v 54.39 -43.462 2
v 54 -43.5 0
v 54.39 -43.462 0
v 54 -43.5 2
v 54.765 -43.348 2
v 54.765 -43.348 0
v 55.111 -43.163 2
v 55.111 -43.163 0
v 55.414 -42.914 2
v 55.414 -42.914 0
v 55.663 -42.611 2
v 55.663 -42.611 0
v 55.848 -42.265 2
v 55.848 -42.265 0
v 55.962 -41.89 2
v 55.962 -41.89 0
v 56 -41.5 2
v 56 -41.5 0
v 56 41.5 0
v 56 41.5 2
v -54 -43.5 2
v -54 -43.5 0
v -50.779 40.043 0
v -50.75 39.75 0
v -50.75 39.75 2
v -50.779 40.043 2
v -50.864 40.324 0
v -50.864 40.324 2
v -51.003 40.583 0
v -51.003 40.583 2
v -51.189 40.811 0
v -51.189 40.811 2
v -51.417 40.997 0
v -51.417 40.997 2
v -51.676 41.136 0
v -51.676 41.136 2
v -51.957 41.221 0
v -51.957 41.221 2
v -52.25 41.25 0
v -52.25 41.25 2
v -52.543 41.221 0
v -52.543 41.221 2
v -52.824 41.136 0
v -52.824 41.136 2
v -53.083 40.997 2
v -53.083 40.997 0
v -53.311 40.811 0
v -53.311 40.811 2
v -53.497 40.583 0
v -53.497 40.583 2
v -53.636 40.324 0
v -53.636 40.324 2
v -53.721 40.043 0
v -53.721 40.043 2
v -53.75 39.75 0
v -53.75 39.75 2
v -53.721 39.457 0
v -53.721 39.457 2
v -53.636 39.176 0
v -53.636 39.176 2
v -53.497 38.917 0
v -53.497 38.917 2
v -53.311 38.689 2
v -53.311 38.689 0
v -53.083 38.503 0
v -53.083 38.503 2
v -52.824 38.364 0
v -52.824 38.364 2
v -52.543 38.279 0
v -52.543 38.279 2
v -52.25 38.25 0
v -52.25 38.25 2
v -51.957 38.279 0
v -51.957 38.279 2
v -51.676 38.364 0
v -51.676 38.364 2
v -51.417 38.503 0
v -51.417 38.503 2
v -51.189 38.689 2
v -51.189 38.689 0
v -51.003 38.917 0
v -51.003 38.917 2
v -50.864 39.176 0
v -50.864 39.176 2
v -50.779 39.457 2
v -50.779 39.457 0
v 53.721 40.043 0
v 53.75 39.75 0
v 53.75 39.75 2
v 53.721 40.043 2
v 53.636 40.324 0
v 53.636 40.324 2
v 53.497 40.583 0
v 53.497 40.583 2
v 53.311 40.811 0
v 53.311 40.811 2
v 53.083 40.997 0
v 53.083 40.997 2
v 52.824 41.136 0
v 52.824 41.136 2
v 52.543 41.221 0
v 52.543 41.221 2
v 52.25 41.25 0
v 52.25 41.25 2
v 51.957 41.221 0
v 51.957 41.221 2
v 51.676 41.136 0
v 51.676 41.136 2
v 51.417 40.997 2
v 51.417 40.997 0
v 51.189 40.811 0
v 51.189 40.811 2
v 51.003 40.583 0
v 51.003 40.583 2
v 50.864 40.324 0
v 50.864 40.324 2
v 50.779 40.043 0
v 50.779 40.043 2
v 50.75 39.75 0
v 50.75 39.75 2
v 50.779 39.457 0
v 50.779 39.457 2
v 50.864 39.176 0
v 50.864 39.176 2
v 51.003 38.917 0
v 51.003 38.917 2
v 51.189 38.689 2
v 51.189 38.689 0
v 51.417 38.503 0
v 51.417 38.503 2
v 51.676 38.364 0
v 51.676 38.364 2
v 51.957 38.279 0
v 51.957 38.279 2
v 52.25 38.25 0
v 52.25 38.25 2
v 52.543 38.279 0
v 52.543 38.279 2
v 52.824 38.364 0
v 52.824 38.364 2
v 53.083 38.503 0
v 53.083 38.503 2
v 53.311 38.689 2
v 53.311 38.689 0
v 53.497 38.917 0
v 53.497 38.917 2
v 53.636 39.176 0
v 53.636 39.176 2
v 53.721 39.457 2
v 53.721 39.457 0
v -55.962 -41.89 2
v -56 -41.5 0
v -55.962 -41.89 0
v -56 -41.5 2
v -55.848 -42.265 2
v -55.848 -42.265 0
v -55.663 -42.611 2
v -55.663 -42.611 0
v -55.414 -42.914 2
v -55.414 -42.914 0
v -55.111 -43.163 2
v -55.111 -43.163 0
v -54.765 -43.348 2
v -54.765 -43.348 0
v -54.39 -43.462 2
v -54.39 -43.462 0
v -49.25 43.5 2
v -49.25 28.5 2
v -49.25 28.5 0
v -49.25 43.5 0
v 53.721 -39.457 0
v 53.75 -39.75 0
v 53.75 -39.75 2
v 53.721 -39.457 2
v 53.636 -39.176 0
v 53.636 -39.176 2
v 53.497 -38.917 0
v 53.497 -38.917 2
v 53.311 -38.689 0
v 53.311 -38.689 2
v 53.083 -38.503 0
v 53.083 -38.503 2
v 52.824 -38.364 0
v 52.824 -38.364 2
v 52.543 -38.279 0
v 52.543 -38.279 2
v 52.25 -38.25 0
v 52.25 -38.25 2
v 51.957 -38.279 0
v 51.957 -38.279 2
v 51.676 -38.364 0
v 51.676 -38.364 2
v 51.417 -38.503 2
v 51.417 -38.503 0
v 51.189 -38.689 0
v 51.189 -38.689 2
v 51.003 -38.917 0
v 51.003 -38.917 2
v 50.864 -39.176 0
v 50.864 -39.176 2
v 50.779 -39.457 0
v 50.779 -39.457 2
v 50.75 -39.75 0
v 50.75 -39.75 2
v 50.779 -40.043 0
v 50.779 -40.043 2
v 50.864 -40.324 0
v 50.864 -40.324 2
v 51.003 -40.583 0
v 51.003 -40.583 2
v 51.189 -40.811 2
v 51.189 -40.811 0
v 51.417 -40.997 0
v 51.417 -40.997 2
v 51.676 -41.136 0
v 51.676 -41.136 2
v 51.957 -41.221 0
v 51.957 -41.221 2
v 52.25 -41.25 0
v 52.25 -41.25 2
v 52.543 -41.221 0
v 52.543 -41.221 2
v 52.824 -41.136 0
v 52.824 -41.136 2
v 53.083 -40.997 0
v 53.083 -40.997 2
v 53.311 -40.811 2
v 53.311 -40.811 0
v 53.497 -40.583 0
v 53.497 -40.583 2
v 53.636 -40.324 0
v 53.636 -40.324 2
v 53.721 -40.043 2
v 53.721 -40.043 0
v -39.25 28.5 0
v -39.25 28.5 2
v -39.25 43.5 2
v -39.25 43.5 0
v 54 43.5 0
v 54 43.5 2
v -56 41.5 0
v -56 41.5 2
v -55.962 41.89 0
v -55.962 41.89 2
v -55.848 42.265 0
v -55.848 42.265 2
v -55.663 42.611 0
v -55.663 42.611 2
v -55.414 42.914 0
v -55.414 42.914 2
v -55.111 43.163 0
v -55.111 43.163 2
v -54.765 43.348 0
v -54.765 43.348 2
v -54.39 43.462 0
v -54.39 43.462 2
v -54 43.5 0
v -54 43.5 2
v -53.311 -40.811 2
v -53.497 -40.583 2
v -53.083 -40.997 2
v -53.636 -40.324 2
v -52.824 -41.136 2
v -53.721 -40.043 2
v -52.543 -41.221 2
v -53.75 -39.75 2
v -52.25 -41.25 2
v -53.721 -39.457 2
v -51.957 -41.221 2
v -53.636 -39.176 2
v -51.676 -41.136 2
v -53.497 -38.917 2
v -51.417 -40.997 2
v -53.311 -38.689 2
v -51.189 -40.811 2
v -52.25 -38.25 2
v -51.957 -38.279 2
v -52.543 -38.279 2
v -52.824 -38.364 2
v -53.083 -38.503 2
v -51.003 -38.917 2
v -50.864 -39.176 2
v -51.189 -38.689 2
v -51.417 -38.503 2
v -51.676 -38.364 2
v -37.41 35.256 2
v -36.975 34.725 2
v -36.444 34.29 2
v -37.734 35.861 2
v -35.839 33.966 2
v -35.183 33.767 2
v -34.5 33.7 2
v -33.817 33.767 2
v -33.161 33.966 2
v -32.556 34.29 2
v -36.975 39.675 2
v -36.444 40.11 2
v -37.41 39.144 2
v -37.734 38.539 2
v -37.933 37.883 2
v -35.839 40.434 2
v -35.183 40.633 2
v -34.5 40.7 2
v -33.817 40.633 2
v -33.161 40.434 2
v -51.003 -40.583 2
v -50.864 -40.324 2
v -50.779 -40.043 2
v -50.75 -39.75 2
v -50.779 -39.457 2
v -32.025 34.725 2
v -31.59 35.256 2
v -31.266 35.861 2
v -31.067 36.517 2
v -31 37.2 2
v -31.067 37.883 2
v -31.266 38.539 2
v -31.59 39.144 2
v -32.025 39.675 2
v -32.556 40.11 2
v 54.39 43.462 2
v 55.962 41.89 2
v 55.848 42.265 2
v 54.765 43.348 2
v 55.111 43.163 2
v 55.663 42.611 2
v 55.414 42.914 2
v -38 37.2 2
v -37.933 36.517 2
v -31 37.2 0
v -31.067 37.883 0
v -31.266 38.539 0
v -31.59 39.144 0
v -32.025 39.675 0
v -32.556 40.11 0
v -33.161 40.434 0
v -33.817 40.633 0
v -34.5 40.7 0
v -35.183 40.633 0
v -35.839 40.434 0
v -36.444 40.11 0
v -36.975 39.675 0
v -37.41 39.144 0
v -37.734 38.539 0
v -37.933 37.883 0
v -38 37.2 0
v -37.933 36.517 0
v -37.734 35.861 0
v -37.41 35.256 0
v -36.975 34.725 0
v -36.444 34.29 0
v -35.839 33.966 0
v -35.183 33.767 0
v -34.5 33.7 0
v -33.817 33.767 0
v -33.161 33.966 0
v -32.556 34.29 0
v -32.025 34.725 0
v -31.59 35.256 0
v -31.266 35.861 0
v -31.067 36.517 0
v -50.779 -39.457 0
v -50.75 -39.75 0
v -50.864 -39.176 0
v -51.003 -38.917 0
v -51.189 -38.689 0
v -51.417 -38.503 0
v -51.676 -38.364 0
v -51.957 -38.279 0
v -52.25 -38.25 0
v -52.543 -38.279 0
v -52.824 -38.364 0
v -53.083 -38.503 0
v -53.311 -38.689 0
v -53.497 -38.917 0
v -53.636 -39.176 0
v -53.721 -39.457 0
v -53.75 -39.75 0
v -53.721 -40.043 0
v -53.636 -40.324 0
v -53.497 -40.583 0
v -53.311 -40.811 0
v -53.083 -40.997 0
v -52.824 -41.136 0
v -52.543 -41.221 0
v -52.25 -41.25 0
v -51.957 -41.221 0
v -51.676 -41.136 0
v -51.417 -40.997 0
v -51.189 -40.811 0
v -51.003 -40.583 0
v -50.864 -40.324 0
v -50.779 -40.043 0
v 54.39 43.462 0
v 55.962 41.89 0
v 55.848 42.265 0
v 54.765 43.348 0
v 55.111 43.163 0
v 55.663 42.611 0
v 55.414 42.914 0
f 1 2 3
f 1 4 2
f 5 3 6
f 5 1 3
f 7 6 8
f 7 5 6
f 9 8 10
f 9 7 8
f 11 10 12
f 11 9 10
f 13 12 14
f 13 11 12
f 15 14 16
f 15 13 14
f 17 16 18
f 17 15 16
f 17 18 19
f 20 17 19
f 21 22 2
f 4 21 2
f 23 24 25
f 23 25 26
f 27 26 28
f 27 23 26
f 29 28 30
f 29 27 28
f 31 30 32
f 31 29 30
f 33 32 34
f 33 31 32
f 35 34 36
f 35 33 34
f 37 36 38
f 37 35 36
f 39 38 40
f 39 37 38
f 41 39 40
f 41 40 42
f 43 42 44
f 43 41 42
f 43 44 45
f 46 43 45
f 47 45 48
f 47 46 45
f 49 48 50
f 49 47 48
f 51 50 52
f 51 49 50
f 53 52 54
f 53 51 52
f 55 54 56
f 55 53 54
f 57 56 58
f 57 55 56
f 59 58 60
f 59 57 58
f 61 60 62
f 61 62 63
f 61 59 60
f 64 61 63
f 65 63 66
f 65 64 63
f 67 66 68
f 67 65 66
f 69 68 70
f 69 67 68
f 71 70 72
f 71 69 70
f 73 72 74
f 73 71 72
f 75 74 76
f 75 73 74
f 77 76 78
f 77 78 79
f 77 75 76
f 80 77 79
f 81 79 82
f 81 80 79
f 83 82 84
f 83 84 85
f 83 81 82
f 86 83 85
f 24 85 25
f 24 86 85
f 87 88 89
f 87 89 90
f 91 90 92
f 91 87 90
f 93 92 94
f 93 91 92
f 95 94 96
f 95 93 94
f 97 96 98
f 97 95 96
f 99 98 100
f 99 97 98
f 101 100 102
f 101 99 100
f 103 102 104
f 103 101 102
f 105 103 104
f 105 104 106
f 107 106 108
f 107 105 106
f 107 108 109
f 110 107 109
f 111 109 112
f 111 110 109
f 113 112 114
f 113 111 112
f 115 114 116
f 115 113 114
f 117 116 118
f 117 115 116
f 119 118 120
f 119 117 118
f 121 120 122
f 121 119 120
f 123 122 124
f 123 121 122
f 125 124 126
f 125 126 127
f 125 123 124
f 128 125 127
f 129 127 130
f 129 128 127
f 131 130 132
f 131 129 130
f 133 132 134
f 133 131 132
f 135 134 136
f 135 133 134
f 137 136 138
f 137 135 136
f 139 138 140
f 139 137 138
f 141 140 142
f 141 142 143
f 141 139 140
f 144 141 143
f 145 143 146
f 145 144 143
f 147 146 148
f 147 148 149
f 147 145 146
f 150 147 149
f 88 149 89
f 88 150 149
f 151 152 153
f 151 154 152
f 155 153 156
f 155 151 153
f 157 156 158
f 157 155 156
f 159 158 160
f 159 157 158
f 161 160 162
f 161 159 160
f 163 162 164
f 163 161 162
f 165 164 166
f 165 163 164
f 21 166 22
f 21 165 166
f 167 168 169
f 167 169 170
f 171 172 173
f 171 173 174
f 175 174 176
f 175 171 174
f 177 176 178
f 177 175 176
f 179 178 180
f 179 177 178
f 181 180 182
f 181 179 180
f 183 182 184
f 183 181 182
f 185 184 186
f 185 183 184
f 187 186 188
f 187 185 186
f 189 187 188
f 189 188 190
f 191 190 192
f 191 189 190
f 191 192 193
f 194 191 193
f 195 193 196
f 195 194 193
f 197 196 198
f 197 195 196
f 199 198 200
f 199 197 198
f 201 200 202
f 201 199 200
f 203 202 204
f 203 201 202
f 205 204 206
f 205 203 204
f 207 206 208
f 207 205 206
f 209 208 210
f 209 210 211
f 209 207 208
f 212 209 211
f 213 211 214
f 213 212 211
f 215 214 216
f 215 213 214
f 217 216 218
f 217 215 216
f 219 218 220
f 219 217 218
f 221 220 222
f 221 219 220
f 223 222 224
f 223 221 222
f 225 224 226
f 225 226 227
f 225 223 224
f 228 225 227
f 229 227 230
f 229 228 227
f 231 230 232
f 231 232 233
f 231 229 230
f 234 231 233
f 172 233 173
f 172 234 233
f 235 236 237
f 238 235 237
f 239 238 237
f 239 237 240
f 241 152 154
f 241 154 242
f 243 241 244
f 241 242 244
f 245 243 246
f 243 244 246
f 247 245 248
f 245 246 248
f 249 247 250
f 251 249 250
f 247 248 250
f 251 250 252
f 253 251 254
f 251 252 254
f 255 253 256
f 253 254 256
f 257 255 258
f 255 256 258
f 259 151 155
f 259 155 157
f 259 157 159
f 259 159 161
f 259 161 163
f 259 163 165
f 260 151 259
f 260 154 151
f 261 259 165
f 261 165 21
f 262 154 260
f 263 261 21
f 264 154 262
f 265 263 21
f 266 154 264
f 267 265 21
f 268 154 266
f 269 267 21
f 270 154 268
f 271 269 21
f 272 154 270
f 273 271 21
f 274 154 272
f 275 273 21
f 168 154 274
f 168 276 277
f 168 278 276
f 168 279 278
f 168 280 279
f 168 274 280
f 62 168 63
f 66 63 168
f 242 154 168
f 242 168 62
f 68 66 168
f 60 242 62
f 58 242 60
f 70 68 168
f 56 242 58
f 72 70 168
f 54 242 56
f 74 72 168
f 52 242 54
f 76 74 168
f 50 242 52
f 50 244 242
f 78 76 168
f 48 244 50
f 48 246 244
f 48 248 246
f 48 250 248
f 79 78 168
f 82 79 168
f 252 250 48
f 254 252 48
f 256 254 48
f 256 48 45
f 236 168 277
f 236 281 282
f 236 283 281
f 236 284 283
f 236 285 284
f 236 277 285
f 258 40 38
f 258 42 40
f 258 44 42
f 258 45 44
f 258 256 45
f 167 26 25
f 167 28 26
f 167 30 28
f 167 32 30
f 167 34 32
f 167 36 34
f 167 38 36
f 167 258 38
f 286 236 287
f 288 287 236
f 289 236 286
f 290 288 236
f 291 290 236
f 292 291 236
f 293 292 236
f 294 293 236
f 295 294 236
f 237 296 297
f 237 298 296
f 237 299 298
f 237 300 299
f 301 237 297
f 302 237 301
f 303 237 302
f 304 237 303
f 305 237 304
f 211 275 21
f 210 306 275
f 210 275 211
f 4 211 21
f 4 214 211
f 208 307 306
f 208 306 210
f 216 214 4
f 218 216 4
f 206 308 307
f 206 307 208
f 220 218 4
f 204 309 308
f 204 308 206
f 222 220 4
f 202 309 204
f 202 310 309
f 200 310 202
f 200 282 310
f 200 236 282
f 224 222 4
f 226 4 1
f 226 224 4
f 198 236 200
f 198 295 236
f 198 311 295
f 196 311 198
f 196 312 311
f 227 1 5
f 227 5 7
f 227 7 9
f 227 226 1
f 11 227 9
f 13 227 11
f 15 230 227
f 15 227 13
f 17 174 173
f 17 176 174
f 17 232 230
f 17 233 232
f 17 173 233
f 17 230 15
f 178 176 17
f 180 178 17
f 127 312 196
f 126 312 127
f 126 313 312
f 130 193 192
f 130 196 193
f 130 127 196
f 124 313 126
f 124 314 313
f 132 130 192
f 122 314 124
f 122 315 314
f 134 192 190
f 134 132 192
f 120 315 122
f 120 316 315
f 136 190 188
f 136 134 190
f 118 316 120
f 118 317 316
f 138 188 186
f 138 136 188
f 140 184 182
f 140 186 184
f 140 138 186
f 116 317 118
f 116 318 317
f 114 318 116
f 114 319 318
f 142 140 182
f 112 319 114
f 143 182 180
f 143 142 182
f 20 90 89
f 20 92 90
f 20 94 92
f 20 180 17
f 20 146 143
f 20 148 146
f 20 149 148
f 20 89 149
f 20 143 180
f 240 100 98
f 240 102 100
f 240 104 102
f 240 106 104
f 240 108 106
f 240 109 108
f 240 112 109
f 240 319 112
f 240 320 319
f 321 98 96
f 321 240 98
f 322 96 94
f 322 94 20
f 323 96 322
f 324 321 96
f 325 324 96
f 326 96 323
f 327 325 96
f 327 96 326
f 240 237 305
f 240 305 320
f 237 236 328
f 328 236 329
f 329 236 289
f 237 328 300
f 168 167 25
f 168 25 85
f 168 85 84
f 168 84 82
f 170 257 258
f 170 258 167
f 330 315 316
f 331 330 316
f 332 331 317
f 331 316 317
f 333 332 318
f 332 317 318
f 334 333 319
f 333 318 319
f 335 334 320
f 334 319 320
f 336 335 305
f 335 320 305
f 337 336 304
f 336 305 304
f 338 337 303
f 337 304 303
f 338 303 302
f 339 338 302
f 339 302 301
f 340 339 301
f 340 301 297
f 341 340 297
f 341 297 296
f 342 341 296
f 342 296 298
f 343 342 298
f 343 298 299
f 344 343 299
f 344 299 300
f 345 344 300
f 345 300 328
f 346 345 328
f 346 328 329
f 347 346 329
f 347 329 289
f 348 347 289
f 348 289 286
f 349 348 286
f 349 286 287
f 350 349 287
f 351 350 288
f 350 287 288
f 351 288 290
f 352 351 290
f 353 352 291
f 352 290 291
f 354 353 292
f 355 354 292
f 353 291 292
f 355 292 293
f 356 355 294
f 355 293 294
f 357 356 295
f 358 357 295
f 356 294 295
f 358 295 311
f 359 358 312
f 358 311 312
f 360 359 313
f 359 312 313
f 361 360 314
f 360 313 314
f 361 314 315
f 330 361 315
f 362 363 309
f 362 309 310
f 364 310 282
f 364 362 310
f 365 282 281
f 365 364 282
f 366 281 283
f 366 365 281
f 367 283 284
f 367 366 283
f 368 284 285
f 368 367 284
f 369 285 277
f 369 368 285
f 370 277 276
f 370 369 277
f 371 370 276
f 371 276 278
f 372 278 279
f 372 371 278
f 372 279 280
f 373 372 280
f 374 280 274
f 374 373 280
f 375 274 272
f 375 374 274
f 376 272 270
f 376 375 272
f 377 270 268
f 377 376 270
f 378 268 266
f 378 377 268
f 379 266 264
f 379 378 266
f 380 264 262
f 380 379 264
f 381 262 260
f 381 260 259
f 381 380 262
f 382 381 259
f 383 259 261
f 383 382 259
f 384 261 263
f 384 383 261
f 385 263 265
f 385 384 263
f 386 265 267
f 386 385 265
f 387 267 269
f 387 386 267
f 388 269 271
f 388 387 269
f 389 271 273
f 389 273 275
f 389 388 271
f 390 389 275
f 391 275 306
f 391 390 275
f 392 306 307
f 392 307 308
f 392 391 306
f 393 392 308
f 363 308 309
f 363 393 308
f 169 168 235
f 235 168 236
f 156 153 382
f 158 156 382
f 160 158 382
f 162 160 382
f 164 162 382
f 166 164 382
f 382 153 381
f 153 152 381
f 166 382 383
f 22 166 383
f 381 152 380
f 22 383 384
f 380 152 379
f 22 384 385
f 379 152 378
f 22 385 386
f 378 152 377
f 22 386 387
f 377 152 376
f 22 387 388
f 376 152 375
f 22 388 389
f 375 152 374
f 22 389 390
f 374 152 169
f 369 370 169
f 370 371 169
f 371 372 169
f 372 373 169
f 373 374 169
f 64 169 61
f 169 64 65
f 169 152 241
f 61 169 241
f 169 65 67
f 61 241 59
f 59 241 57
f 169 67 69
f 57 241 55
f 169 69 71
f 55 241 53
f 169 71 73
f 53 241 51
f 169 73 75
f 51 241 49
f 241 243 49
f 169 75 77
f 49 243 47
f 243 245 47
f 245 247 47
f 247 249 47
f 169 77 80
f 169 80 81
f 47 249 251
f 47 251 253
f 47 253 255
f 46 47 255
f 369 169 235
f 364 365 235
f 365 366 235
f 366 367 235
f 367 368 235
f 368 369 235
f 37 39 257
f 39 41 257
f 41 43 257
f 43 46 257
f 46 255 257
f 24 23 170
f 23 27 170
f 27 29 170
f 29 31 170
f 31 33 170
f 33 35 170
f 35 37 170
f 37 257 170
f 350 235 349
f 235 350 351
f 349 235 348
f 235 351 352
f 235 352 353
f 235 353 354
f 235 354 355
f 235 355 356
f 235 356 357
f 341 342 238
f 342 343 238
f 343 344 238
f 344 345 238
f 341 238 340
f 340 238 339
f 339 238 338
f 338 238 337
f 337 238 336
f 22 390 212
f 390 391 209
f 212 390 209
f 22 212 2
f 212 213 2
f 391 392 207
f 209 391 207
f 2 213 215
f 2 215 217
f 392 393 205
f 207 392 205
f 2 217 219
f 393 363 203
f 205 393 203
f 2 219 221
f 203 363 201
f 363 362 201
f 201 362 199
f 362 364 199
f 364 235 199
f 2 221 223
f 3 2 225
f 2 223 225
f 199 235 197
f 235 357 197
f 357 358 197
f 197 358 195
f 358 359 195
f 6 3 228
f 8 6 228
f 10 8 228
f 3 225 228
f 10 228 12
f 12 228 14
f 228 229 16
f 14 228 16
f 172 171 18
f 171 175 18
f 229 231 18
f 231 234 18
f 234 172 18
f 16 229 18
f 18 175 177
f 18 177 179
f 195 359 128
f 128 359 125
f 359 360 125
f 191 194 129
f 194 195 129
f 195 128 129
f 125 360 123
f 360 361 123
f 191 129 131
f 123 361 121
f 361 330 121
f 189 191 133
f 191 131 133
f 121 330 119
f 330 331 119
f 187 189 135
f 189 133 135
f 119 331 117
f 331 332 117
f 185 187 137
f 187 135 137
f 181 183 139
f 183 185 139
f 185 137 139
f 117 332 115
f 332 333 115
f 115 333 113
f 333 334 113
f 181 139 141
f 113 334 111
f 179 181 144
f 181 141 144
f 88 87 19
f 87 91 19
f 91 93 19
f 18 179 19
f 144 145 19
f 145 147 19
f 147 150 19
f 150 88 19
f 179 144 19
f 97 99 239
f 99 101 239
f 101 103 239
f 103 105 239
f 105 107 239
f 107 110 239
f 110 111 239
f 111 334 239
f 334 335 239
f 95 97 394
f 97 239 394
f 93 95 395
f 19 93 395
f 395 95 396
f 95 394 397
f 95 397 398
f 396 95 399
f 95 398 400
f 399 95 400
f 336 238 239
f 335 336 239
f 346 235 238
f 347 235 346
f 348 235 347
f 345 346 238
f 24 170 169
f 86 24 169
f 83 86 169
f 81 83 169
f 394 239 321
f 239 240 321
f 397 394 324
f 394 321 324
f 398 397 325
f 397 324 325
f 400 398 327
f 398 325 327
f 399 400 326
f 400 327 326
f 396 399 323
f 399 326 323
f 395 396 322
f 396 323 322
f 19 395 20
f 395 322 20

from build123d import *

# Parameters (mm, degrees)
F0_W     = 112
F0_H     = 87
F0_R     = 1.5
F1_DEPTH = 2
F2_R     = 2
F3_W     = 10
F3_H     = 15
F3_R     = 3.5
F4_DEPTH = 2.001


with BuildPart() as f1:
    # F0 (on Top) → F1 (new body)
    with BuildSketch(Plane.XY):
        Rectangle(F0_W, F0_H)
        with Locations((-52.25, -39.75)):
            Circle(F0_R, mode=Mode.SUBTRACT)
        with Locations((52.25, -39.75)):
            Circle(F0_R, mode=Mode.SUBTRACT)
        with Locations((-52.25, 39.75)):
            Circle(F0_R, mode=Mode.SUBTRACT)
        with Locations((52.25, 39.75)):
            Circle(F0_R, mode=Mode.SUBTRACT)
    extrude(amount=F1_DEPTH)

    # F2
    f2_edges = [f1.edges().sort_by_distance(p)[0] for p in [
        (-56, -43.5, 1),
        (-56, 43.5, 1),
        (56, 43.5, 1),
        (56, -43.5, 1),
    ]]
    fillet(f2_edges, radius=F2_R)

    # F3 (on face) → F4 (cut, through all)
    with BuildSketch(Plane.XY.offset(2)):
        with Locations((-44.25, 36)):
            Rectangle(F3_W, F3_H)
        with Locations((-34.5, 37.2)):
            Circle(F3_R)
    extrude(amount=-F4_DEPTH, mode=Mode.SUBTRACT)


solid = f1.part
